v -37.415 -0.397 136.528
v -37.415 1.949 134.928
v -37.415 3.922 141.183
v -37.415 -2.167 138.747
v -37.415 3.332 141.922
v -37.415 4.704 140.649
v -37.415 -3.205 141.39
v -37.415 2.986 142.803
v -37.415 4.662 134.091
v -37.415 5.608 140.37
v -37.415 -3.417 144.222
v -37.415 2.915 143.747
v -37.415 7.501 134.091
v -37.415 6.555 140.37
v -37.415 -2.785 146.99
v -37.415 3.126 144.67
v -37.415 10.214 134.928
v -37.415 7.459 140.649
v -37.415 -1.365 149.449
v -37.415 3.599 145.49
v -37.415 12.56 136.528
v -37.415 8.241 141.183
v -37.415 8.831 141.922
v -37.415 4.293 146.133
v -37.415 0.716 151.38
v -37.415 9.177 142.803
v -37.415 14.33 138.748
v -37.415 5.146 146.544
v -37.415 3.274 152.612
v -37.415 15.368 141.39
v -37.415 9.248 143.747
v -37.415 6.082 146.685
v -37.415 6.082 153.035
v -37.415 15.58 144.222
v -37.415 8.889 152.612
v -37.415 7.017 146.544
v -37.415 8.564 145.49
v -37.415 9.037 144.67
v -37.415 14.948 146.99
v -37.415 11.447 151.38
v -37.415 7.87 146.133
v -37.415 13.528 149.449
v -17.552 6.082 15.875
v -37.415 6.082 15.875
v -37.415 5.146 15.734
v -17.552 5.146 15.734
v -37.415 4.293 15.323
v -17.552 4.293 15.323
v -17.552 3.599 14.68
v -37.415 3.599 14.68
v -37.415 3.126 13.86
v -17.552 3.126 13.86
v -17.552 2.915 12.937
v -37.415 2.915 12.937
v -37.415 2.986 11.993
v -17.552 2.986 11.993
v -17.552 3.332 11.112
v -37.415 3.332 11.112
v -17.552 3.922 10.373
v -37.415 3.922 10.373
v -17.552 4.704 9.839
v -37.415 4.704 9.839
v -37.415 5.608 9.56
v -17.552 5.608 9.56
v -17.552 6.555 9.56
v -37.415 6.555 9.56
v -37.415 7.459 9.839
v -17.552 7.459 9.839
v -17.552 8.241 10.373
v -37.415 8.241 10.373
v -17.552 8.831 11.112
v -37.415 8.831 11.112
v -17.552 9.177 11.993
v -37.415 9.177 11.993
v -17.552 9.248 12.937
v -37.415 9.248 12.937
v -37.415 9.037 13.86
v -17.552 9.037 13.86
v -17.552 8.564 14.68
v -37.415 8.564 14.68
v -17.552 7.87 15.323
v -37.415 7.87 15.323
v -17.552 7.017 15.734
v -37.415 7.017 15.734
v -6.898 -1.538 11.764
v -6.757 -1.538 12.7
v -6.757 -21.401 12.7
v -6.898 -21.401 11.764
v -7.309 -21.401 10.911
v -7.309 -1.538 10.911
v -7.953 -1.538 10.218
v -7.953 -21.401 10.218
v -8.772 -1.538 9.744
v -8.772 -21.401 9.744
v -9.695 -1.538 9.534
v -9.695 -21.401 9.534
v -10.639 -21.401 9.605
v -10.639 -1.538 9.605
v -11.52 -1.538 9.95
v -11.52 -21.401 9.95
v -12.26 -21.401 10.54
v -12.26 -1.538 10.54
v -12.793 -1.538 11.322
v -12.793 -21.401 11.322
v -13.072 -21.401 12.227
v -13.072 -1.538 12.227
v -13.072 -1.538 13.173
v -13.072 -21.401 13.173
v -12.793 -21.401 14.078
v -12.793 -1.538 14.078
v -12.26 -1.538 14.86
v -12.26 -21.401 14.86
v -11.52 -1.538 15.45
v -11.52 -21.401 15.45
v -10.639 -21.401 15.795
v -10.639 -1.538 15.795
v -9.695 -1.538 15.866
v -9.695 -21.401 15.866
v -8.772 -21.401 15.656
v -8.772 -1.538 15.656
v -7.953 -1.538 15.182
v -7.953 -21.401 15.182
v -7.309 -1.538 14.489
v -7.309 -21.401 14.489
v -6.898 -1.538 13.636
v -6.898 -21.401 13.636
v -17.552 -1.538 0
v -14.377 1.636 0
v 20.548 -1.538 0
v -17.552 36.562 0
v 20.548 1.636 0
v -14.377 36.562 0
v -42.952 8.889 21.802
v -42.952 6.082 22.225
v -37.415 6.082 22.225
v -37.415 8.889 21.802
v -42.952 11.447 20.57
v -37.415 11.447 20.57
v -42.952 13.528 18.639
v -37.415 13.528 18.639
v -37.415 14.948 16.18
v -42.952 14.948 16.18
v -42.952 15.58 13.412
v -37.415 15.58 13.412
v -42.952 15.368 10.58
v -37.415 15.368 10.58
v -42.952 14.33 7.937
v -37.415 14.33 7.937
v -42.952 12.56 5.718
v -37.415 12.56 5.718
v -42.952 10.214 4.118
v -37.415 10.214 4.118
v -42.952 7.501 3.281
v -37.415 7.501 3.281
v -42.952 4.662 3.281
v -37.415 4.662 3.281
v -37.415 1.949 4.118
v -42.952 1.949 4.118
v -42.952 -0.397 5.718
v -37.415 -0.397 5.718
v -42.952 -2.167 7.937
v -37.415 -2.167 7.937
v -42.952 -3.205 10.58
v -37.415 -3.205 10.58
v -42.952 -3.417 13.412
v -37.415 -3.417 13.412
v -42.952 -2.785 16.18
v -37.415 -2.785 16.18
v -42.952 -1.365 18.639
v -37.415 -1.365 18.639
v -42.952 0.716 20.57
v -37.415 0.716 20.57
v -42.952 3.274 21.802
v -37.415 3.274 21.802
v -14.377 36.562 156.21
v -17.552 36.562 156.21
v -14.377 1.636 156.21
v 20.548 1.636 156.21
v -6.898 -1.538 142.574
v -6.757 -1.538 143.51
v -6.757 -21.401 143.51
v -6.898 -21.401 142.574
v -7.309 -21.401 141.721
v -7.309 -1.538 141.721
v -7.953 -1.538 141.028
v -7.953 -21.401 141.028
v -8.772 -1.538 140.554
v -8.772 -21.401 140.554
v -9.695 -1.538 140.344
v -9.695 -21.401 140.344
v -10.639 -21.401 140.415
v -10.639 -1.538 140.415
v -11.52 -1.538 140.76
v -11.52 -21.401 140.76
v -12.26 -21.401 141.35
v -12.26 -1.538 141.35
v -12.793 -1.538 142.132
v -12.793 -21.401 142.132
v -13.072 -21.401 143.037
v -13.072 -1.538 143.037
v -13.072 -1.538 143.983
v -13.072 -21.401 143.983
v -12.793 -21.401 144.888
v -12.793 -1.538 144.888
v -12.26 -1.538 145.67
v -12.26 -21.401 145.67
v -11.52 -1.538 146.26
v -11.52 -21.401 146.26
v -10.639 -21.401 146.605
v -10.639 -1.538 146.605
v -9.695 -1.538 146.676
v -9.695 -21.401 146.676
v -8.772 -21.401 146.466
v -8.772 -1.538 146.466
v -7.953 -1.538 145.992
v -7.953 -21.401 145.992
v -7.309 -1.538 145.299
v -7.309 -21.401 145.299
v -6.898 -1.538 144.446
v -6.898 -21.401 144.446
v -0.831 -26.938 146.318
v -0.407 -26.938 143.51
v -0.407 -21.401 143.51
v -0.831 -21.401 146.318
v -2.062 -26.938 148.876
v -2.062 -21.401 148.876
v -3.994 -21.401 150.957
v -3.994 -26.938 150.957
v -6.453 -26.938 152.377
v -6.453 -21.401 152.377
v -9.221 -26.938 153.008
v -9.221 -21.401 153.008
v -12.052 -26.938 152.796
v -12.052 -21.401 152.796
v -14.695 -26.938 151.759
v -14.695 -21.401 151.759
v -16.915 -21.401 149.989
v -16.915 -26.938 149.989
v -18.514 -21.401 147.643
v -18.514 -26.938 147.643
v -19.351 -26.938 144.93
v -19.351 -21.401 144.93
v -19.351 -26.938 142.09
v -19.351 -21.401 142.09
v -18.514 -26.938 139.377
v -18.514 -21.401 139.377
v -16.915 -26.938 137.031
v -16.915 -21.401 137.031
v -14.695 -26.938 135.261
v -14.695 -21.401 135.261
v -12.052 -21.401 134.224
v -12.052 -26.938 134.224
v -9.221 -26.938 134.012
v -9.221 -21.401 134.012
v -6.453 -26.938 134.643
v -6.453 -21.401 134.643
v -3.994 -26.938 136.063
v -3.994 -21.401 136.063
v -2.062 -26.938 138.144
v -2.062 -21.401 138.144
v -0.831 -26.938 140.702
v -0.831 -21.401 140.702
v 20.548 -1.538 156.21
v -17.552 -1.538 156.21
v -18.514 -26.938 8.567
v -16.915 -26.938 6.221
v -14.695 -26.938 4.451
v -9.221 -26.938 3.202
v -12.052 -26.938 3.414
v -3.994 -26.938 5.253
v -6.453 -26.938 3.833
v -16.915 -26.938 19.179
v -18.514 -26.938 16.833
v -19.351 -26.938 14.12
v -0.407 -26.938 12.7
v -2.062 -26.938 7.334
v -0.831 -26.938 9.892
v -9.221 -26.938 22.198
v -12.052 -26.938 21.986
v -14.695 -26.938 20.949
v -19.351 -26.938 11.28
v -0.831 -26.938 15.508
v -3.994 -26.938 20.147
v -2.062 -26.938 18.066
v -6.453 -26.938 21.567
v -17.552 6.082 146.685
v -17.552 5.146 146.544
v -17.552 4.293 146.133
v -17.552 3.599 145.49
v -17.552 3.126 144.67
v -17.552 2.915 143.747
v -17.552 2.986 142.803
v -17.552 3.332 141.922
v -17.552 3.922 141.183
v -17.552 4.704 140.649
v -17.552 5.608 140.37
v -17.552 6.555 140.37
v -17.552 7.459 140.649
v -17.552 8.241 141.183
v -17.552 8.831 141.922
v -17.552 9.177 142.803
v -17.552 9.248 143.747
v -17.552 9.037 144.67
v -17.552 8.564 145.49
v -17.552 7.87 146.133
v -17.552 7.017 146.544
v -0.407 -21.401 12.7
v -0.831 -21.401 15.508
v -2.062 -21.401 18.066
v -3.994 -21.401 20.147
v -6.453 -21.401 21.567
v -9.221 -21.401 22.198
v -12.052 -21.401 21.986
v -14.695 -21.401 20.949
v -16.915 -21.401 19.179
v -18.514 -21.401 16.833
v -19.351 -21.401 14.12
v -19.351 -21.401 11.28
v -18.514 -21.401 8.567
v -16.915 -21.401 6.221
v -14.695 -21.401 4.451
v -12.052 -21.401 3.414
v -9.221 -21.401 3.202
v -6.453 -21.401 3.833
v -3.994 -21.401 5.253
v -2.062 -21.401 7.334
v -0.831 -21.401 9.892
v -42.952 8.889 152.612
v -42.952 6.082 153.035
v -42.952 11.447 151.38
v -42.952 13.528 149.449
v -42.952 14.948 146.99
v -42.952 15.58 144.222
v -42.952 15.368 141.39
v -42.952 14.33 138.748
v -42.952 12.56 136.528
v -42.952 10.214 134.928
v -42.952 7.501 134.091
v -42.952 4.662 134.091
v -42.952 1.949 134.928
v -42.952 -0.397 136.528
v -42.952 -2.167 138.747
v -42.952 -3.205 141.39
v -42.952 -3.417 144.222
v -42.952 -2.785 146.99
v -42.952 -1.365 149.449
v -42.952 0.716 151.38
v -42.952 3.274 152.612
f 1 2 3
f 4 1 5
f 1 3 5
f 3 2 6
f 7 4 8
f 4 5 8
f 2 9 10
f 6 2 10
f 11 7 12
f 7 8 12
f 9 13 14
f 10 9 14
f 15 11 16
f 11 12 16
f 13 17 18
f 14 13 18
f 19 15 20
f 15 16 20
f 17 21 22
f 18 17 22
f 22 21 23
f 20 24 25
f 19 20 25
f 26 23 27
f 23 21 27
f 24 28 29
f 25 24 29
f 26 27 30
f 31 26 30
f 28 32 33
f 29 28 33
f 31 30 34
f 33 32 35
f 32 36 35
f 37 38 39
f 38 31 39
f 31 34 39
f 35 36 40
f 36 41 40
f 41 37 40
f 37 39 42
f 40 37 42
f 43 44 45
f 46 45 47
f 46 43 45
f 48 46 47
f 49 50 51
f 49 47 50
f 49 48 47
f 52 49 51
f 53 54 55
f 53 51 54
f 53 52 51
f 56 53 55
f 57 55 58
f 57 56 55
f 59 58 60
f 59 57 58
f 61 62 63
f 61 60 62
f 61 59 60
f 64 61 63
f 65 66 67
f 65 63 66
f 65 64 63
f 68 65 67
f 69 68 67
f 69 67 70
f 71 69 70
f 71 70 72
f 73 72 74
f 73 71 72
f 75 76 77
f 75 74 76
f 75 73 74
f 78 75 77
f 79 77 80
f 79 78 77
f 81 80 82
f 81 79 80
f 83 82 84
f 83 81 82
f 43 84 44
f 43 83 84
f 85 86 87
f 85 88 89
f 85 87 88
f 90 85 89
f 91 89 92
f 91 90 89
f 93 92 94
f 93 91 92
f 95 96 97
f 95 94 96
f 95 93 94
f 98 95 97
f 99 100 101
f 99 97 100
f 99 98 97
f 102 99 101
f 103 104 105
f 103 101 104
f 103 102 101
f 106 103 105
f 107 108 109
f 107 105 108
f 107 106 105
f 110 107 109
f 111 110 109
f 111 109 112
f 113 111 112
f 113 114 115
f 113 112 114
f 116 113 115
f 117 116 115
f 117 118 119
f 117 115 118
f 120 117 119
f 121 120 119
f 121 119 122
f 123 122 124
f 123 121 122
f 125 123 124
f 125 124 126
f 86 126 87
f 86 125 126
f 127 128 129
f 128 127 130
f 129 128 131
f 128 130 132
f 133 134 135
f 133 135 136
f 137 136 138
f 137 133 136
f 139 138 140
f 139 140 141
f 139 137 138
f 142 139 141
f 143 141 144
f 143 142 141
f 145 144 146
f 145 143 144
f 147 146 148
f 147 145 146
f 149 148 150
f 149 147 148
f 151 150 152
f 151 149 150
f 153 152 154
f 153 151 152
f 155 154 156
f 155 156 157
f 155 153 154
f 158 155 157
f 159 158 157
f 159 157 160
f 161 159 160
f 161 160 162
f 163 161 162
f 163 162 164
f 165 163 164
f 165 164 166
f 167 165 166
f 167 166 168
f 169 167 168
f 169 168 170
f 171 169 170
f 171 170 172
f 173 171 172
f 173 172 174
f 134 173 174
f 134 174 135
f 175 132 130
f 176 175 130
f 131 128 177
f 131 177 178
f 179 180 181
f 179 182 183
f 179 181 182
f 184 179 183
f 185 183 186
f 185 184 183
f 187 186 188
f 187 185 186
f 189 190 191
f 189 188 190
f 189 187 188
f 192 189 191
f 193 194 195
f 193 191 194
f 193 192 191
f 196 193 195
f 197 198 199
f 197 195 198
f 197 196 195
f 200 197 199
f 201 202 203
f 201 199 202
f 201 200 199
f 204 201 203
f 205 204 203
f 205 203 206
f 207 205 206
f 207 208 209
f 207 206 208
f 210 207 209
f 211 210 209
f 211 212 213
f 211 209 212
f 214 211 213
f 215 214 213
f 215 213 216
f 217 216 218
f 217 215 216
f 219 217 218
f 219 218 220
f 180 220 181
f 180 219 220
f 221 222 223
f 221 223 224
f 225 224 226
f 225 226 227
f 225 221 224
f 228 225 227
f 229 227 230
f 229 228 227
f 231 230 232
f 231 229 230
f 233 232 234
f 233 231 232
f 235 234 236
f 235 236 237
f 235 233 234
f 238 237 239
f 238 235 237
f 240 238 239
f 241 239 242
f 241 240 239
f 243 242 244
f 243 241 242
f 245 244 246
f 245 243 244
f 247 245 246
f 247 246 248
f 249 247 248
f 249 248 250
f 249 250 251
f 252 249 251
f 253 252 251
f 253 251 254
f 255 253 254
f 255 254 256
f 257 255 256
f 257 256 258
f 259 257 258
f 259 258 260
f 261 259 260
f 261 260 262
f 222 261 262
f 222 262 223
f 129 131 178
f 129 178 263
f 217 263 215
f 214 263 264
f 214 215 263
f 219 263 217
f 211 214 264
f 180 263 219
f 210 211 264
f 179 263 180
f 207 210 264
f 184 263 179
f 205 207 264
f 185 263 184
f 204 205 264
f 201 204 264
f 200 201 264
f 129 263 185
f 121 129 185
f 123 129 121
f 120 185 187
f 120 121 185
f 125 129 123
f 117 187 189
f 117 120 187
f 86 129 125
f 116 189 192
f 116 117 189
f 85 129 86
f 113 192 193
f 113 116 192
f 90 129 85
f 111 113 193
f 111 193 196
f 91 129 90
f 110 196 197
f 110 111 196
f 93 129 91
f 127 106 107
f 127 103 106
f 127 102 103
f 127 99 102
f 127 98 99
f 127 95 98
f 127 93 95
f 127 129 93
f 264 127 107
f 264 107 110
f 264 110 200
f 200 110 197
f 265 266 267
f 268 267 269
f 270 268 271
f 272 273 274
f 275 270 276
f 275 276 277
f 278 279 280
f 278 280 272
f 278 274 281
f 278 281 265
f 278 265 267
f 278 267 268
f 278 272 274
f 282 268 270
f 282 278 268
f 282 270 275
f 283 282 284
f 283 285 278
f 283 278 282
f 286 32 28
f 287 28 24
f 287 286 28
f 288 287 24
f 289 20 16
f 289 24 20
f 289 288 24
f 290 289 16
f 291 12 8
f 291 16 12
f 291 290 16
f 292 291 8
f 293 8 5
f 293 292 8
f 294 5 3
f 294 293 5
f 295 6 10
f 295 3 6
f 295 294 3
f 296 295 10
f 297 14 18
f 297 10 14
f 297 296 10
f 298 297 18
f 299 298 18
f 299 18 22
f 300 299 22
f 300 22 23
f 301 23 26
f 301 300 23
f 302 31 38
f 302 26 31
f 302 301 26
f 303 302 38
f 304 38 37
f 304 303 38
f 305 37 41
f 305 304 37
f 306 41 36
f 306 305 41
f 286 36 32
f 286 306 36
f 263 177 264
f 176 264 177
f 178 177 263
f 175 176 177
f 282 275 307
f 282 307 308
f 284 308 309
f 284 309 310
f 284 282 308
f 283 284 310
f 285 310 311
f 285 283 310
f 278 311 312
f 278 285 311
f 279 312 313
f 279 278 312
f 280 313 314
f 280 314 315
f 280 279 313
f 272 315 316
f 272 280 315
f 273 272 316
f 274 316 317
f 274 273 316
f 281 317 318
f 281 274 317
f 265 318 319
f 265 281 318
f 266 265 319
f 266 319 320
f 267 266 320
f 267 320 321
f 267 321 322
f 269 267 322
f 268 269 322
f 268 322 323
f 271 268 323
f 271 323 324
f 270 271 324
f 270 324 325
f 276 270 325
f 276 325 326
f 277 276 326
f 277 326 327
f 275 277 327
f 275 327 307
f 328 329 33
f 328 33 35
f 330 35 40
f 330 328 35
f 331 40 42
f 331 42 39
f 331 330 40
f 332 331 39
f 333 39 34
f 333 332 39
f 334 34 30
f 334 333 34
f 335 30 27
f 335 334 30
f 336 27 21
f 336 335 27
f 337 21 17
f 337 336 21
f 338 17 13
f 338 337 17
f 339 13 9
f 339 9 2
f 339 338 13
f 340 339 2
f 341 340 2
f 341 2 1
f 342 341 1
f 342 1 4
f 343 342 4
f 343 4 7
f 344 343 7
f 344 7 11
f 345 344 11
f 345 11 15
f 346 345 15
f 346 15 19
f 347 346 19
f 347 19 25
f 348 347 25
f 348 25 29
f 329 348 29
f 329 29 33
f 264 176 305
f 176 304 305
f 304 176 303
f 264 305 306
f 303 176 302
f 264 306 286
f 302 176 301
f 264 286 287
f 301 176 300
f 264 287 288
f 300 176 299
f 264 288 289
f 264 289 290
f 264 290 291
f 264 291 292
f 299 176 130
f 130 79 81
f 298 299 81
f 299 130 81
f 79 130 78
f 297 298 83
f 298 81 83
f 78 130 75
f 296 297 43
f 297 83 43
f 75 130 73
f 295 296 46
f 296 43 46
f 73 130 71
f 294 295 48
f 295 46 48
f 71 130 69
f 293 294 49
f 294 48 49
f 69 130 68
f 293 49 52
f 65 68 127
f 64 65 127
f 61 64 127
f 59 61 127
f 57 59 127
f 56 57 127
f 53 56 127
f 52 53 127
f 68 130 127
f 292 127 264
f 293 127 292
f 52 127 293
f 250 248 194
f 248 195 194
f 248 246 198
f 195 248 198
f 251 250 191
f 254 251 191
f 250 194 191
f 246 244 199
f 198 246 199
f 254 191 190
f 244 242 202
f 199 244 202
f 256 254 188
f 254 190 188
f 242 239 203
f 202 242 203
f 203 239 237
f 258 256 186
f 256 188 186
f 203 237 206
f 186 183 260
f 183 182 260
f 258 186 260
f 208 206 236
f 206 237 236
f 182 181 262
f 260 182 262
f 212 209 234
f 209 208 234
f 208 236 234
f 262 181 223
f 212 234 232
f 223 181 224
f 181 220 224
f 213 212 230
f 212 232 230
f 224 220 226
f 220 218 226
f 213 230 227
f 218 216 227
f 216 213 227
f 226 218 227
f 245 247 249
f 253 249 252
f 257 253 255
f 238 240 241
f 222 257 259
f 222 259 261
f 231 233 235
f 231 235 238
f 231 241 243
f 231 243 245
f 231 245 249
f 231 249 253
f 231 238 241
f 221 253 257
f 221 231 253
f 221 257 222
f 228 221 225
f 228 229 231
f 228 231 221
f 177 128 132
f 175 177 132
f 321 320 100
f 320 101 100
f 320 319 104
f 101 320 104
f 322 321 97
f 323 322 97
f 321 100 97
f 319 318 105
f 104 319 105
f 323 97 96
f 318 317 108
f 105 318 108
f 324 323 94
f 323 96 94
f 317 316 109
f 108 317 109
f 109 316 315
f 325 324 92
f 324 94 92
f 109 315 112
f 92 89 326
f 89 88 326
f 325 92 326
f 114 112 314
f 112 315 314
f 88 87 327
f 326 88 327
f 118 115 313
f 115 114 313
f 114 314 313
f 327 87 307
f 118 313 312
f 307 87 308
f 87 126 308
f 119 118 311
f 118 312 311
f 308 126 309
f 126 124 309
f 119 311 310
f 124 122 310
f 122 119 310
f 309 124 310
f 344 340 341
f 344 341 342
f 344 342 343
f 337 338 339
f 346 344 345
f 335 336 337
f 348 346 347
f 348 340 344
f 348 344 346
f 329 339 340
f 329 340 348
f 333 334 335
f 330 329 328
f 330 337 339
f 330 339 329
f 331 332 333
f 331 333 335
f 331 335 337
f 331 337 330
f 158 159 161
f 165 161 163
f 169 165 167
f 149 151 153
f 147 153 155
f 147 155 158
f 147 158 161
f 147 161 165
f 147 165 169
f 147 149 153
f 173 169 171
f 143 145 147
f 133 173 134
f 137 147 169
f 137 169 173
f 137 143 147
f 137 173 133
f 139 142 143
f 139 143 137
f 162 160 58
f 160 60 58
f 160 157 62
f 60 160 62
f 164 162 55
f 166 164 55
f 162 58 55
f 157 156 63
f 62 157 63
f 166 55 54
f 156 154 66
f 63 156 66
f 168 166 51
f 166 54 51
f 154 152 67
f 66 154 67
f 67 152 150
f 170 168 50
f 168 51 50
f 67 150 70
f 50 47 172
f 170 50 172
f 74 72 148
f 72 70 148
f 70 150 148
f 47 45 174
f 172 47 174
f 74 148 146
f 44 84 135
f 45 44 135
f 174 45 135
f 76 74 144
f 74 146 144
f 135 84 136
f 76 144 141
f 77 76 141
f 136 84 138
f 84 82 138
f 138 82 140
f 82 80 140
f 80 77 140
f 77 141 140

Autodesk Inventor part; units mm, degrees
ref_plane "YZ Plane" through (0, 0, 0) normal (1, 0, 0) x (0, 1, 0)
ref_plane "XZ Plane" through (0, 0, 0) normal (0, 1, 0) x (-1, 0, 0)
ref_plane "XY Plane" through (0, 0, 0) normal (0, 0, 1) x (1, 0, 0)
sketch "Sketch1" plane through (0, 0, 0) normal (0, 0, 1) x (1, 0, 0)
  line L0 (-17.5524, 1.6365) -> (20.5476, 1.6365)
  line L1 (20.5476, 1.6365) -> (20.5476, -1.5385)
  line L2 (20.5476, -1.5385) -> (-17.5524, -1.5385)
  line L3 (-17.5524, -1.5385) -> (-17.5524, 1.6365)
  line L4 (-17.5524, -1.5385) -> (-14.3774, -1.5385)
  line L5 (-14.3774, -1.5385) -> (-14.3774, 36.5615)
  line L6 (-14.3774, 36.5615) -> (-17.5524, 36.5615)
  line L7 (-17.5524, 36.5615) -> (-17.5524, -1.5385)
  point P0 (0, 0)
  dimension "d0" = 38.1
  dimension "d1" = 38.1
  dimension "d2" = 3.175
  dimension "d3" = 3.175
extrude "Extrusion1" add sketch "Sketch1" along normal blind 156.21
sketch "Sketch2" plane through (-17.5524, -1.5385, 0) normal (-1, 0, 0) x (0, 0, 1)
  line L0 (156.21, 0) -> (156.21, 38.1) projected
  line L1 (0, 38.1) -> (0, 0) projected
  line L2 (0, 0) -> (156.21, 0) projected
  circle A0 centre (12.7, 7.62) radius 3.175
  circle A1 centre (143.51, 7.62) radius 3.175
  point P0 (0, 1.5385)
  dimension "d6" = 6.35
  dimension "d7" = 6.35
  dimension "d8" = 12.7
  dimension "d9" = 12.7
  dimension "d10" = 7.62
  dimension "d11" = 7.62
extrude "Extrusion2" add sketch "Sketch2" along normal blind 25.4
sketch "Sketch3" plane through (-17.5524, -1.5385, 0) normal (0, -1, 0) x (1, 0, 0)
  line L0 (38.1, 156.21) -> (0, 156.21) projected
  line L1 (0, 0) -> (0, 156.21) projected
  line L2 (0, 0) -> (38.1, 0) projected
  circle A0 centre (7.62, 143.51) radius 3.175
  circle A1 centre (7.62, 12.7) radius 3.175
  point P0 (17.5524, 0)
  dimension "d14" = 12.7
  dimension "d15" = 12.7
  dimension "d16" = 7.62
  dimension "d17" = 7.62
  dimension "d18" = 6.35
  dimension "d19" = 6.35
extrude "Extrusion3" add sketch "Sketch3" along normal blind 25.4
sketch "Sketch4" plane through (-42.9524, 6.0815, 143.51) normal (-1, 0, 0) x (0, 0, 1)
  circle A0 centre (0, 0) radius 3.175 projected
  circle A1 centre (0, 0) radius 9.525
  point P0 (-143.51, -6.0815)
  dimension "d22" = 19.05
extrude "Extrusion4" add sketch "Sketch4" against normal blind 5.5372
sketch "Sketch5" plane through (-42.9524, 6.0815, 12.7) normal (-1, 0, 0) x (0, 0, 1)
  circle A0 centre (0, 0) radius 3.175 projected
  circle A1 centre (0, 0) radius 9.525
  point P0 (-12.7, -6.0815)
  dimension "d25" = 19.05
extrude "Extrusion5" add sketch "Sketch5" against normal blind 5.5372
sketch "Sketch6" plane through (-9.9324, -26.9385, 143.51) normal (0, -1, 0) x (1, 0, 0)
  circle A0 centre (0, 0) radius 3.175 projected
  circle A1 centre (0, 0) radius 9.525
  point P0 (9.9324, -143.51)
  dimension "d28" = 19.05
extrude "Extrusion6" add sketch "Sketch6" against normal blind 5.5372
sketch "Sketch7" plane through (-9.9324, -26.9385, 12.7) normal (0, -1, 0) x (1, 0, 0)
  circle A0 centre (0, 0) radius 3.175 projected
  circle A1 centre (0, 0) radius 9.525
  point P0 (9.9324, -12.7)
  dimension "d31" = 19.05
extrude "Extrusion7" add sketch "Sketch7" against normal blind 5.5372
ref_plane "Work Plane1" through (-17.5524, -1.5385, 0) normal (0.7071, 0.7071, 0) x (0, 0, 1)
sketch "Sketch8" plane through (-17.5524, -1.5385, 0) normal (0.7071, 0.7071, 0) x (0, 0, 1)
  line L0 (156.21, 0) -> (156.21, -26.9408) projected
  line L1 (0, -26.9408) -> (0, 0) projected
  line L2 (0, -26.9408) -> (156.21, -26.9408) projected
  point P0 (0, 11.3236)
  point P1 (38.1, -0.0168)
  point P2 (118.11, -0.0168)
  dimension "d35" = 38.1
  dimension "d36" = 38.1
  dimension "d37" = 26.924
  dimension "d38" = 26.924
equation "\"d7\" = d6"
properties part number "x-bearing assy"
